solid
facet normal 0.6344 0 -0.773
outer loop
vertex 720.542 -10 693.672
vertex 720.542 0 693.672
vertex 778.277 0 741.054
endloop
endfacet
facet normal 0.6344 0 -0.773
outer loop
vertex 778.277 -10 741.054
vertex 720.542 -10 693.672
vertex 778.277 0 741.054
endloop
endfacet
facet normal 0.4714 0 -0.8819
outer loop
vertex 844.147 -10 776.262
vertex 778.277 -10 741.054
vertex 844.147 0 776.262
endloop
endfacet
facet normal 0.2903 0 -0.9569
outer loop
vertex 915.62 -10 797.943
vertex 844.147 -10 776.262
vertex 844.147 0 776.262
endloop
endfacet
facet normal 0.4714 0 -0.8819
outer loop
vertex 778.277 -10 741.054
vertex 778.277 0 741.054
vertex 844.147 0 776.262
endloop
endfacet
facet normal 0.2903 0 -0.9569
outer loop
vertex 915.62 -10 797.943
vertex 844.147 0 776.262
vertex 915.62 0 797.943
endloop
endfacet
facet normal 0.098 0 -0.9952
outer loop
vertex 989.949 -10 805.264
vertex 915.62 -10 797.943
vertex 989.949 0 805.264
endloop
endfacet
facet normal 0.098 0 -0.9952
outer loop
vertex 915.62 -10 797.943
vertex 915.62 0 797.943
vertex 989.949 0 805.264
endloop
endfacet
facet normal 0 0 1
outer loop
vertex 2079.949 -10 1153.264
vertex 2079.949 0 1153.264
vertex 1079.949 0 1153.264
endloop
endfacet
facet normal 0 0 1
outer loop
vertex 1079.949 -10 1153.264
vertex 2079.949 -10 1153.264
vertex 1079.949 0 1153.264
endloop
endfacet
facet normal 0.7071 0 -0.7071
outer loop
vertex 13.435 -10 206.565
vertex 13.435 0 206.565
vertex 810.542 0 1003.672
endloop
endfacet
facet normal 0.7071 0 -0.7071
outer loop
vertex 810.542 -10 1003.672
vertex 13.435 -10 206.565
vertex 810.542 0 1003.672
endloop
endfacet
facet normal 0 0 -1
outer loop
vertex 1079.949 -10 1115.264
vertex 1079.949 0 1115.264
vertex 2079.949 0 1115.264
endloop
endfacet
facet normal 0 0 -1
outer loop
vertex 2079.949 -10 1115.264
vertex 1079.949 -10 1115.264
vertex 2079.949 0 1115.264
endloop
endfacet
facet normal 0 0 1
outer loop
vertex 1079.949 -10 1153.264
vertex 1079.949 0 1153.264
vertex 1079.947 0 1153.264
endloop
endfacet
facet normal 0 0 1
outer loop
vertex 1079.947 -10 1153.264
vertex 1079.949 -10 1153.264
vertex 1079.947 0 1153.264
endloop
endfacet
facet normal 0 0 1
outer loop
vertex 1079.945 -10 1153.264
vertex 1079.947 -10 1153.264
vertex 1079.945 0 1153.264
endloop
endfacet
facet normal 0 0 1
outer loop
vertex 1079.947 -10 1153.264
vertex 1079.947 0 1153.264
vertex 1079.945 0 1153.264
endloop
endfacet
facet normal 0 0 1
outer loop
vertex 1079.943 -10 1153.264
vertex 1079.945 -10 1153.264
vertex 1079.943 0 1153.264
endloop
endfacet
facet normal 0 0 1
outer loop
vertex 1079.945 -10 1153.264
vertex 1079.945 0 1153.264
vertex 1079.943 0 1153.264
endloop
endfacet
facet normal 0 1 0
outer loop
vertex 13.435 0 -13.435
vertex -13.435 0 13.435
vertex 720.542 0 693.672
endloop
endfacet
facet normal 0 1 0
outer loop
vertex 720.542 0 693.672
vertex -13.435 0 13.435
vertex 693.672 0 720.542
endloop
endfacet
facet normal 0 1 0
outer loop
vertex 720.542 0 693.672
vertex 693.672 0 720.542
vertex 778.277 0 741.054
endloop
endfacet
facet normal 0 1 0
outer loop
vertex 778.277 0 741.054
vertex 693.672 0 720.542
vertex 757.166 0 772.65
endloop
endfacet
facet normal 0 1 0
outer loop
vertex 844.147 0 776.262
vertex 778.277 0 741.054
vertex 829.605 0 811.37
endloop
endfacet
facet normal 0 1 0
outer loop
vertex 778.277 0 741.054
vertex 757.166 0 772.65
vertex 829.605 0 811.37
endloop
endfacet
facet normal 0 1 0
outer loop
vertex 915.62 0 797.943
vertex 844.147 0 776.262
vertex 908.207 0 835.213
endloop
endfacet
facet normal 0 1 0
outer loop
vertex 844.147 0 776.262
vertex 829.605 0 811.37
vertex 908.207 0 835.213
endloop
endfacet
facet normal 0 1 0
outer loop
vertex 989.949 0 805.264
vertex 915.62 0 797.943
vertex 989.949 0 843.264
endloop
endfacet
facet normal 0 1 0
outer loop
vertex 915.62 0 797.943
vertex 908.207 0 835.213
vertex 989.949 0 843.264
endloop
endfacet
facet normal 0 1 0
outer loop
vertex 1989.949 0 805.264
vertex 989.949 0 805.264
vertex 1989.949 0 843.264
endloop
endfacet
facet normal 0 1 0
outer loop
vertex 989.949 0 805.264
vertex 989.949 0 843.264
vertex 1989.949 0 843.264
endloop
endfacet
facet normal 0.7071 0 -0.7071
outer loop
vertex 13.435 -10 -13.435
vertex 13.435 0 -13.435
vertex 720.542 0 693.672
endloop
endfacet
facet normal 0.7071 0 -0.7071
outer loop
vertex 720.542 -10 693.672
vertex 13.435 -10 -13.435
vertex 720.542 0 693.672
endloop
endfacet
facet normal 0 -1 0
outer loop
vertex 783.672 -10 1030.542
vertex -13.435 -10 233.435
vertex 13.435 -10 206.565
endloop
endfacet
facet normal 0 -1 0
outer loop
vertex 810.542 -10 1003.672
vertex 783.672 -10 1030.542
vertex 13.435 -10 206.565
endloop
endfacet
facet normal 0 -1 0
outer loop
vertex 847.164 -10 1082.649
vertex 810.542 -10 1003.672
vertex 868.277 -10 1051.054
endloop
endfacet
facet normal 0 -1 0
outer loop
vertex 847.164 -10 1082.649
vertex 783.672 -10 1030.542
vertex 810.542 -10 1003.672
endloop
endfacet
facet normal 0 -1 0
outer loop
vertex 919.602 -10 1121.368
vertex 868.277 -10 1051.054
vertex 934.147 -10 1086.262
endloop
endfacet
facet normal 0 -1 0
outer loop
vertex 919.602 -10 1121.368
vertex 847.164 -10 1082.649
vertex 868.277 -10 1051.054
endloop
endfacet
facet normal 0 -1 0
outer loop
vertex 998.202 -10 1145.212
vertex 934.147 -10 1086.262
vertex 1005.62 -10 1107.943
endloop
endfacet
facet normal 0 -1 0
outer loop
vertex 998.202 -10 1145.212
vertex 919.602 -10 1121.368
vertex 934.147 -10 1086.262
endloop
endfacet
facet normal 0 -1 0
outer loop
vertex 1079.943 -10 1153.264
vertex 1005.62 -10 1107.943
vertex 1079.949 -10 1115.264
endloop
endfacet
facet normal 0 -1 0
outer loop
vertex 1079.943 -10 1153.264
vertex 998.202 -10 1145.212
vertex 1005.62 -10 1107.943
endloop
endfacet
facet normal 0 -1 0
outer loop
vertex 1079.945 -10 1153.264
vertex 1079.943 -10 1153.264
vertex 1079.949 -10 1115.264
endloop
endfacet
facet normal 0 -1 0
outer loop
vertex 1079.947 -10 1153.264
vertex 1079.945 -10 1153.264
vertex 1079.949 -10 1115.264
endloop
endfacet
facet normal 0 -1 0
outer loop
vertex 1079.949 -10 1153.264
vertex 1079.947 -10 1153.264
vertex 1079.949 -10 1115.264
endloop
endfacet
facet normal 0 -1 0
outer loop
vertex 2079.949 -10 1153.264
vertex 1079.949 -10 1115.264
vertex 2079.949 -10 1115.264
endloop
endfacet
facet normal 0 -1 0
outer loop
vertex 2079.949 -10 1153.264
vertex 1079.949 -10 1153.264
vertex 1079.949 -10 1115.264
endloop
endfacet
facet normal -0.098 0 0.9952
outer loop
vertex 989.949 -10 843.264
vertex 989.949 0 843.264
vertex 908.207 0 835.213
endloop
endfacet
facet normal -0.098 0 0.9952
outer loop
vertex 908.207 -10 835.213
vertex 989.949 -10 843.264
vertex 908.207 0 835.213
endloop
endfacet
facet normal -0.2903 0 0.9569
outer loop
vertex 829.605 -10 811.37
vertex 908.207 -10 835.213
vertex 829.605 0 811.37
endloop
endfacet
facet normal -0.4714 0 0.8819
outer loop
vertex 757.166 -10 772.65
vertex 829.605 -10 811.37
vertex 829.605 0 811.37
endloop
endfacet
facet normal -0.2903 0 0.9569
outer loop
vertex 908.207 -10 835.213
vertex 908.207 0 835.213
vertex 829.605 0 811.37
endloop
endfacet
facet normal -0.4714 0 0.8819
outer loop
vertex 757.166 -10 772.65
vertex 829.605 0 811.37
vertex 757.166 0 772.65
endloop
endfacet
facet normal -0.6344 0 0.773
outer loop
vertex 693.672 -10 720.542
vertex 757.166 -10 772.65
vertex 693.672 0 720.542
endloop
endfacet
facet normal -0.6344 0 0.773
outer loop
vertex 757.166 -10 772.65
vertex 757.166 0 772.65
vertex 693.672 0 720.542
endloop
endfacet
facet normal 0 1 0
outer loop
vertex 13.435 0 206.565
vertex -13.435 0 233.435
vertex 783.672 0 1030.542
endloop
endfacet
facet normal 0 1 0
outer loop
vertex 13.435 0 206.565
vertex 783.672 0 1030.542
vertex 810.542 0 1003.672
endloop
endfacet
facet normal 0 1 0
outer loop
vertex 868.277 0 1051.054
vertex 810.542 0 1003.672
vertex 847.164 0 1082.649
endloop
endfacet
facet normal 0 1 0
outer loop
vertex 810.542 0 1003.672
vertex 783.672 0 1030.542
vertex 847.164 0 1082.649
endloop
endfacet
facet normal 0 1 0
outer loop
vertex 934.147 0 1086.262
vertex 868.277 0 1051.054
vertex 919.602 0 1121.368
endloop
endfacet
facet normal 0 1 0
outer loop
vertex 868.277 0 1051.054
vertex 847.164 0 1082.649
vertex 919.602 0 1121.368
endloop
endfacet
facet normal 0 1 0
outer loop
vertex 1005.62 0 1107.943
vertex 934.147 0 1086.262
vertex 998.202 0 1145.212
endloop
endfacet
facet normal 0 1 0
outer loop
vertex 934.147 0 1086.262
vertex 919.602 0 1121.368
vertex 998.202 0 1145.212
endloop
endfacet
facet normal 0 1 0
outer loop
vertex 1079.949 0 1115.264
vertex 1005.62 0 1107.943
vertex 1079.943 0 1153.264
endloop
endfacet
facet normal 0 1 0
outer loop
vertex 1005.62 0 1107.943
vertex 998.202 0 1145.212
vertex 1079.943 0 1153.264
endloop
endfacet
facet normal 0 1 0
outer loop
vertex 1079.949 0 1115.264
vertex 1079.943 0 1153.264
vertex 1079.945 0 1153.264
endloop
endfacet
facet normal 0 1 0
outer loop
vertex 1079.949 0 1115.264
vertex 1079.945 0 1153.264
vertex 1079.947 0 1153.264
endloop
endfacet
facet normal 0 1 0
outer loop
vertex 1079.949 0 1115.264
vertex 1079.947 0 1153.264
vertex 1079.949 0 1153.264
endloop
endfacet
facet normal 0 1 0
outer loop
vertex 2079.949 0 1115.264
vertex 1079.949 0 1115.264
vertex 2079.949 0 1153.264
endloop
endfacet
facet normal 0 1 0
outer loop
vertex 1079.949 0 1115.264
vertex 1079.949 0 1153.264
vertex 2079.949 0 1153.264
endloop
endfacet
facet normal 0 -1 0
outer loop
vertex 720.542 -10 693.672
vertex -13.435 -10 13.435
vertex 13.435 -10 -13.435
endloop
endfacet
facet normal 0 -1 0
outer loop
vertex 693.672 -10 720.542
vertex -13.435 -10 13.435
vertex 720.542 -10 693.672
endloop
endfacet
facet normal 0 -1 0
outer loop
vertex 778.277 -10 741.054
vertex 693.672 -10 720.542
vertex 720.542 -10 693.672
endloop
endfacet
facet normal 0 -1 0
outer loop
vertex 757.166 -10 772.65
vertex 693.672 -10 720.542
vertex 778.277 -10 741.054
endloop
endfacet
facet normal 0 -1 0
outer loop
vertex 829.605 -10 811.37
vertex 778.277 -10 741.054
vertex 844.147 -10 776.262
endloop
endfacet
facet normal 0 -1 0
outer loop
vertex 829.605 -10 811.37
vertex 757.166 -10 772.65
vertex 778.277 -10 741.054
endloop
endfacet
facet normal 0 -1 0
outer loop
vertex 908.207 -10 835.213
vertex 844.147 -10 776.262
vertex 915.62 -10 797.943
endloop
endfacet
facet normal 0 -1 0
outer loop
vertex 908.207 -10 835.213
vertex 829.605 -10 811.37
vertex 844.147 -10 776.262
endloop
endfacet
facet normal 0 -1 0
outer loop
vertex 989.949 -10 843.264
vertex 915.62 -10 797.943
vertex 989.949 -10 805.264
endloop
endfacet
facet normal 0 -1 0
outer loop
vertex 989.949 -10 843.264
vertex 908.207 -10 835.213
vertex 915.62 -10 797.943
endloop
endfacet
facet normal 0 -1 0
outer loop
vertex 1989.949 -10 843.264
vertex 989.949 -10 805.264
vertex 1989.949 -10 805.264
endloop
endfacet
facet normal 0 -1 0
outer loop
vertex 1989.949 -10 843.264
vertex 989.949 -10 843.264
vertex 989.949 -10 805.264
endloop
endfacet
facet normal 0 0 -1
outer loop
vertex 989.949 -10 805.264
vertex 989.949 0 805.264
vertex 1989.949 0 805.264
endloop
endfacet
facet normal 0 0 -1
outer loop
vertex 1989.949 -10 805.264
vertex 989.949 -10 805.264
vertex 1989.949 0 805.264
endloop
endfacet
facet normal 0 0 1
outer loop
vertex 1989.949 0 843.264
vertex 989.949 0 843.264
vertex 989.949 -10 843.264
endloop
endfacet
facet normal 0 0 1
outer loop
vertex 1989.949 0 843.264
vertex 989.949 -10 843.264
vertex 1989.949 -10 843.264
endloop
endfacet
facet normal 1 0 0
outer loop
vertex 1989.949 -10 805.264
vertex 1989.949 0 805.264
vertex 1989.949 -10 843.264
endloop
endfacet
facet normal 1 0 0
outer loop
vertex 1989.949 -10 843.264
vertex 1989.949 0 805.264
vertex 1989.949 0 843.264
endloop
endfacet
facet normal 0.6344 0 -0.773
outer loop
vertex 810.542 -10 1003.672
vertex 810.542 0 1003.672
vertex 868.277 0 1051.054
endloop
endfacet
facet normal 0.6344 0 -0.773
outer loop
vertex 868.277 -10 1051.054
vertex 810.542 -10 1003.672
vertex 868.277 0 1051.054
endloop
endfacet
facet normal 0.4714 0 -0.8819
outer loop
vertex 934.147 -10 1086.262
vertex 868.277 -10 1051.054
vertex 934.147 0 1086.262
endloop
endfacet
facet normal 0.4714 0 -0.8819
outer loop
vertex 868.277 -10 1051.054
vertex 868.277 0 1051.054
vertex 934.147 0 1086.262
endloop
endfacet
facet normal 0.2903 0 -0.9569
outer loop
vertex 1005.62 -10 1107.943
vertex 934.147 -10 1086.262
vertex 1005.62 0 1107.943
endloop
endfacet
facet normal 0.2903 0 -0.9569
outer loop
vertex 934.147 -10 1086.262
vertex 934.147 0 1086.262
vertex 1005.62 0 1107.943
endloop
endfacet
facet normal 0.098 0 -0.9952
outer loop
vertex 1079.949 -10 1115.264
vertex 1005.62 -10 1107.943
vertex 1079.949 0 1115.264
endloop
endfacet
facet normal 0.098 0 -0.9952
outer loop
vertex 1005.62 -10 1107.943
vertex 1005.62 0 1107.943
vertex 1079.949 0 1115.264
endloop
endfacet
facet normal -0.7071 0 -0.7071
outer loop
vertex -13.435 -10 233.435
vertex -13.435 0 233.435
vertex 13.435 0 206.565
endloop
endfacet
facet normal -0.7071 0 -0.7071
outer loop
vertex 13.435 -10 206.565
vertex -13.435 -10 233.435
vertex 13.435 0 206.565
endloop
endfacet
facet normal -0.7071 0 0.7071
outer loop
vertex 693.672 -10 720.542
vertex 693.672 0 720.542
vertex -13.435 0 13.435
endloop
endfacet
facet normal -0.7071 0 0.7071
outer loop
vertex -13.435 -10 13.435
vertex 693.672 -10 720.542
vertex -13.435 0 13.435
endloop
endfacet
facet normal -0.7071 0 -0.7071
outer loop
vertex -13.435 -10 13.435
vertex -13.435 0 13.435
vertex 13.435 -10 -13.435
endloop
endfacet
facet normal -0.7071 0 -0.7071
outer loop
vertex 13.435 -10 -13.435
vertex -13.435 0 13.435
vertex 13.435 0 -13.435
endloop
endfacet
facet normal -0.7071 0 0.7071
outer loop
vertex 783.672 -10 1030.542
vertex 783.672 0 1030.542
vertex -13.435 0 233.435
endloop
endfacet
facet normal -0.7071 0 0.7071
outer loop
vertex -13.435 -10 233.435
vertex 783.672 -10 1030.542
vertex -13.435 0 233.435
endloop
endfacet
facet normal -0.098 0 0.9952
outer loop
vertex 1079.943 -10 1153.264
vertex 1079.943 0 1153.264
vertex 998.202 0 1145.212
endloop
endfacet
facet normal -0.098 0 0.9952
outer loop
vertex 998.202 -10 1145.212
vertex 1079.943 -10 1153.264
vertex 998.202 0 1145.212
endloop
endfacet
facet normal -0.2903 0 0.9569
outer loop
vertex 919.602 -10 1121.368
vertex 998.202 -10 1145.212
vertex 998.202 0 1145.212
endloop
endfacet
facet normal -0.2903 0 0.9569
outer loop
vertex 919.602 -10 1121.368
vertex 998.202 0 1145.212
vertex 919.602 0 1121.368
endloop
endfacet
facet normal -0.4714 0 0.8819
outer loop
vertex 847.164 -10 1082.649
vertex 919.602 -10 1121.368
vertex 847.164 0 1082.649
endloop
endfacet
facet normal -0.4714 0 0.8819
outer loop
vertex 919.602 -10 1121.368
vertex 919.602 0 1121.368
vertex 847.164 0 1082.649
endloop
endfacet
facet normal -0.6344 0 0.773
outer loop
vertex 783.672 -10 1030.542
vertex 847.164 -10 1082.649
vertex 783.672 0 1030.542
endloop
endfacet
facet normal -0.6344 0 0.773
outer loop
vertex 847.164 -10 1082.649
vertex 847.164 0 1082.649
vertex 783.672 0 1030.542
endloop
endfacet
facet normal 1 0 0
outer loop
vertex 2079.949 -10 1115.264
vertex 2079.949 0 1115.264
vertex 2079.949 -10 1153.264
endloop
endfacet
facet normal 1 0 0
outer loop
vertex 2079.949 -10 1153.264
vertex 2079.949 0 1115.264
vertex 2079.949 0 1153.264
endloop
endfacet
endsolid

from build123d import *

# Parameters (mm, degrees)
F1_DEPTH = 10
F0_W     = 1000
F0_H     = 3.5


with BuildPart() as f1:
    # F0 (on Front) → F1 (new body)
    with BuildSketch(Plane.XZ):
        with BuildLine():
            Line((786.1466260782, 1028.0669362949), (696.1466260782, 938.0669362949))
            Line((696.1466260782, 938.0669362949), (-10.9601551084, 230.9601551084))
            Line((-10.9601551084, 230.9601551084), (0, 220))
            Line((0, 220), (13.4350288425, 206.5649711575))
            Line((13.4350288425, 206.5649711575), (810.5418100291, 1003.671752344))
            ThreePointArc((810.5418100291, 1003.671752344), (934.1471059301, 1086.2621705987), (1079.9494936612, 1115.2640687119))
            Line((1079.9494936612, 1115.2640687119), (2079.9494936612, 1115.2640687119))
            Line((2079.9494936612, 1115.2640687119), (2079.9494936612, 1134.2640687119))
            Line((2079.9494936612, 1134.2640687119), (2079.9494936612, 1149.7640686668))
            Line((2079.9494936612, 1149.7640686668), (1079.9433686799, 1149.7640686668))
            ThreePointArc((1079.9433686799, 1149.7640686668), (920.9416981454, 1118.1348424955), (786.1466260782, 1028.0669362949))
        make_face()
        Polygon((-10.9601551084, 230.9601551084), (696.1466260782, 938.0669362949), (693.671752344, 940.5418100291), (-13.4350288425, 233.4350288425), align=None)
        with BuildLine():
            Line((783.671752344, 1030.5418100291), (786.1466260782, 1028.0669362949))
            ThreePointArc((786.1466260782, 1028.0669362949), (920.9416981454, 1118.1348424955), (1079.9433686799, 1149.7640686668))
            Line((1079.9433686799, 1149.7640686668), (2079.9494936612, 1149.7640686668))
            Line((2079.9494936612, 1149.7640686668), (2079.9494936612, 1153.2640687119))
            Line((2079.9494936612, 1153.2640687119), (1079.9494936612, 1153.2640687119))
            ThreePointArc((1079.9494936612, 1153.2640687119), (1079.9464311705, 1153.2640687007), (1079.9433686799, 1153.2640686672))
            ThreePointArc((1079.9433686799, 1153.2640686672), (919.6023061321, 1121.3684208594), (783.671752344, 1030.5418100291))
        make_face()
        Polygon((693.671752344, 940.5418100291), (696.1466260782, 938.0669362949), (786.1466260782, 1028.0669362949), (783.671752344, 1030.5418100291), align=None)
    extrude(amount=F1_DEPTH)


with BuildPart() as f1b:
    # F0 (on Front) → F1, piece 2 (new body)
    with BuildSketch(Plane.XZ):
        with BuildLine():
            Line((-10.9601551084, 10.9601551084), (0, 0))
            Line((0, 0), (13.4350288425, -13.4350288425))
            Line((13.4350288425, -13.4350288425), (720.5418100291, 693.671752344))
            ThreePointArc((720.5418100291, 693.671752344), (844.1471059301, 776.2621705987), (989.9494936612, 805.2640687119))
            Line((989.9494936612, 805.2640687119), (1989.9494936612, 805.2640687119))
            Line((1989.9494936612, 805.2640687119), (1989.9494936612, 824.2640687119))
            Line((1989.9494936612, 824.2640687119), (1989.9494936612, 839.7640687119))
            Line((1989.9494936612, 839.7640687119), (989.9494936612, 839.7640687119))
            ThreePointArc((989.9494936612, 839.7640687119), (830.9445275135, 808.1360144704), (696.1466260782, 718.0669362949))
            Line((696.1466260782, 718.0669362949), (-10.9601551084, 10.9601551084))
        make_face()
        Polygon((-13.4350288425, 13.4350288425), (-10.9601551084, 10.9601551084), (696.1466260782, 718.0669362949), (693.671752344, 720.5418100291), align=None)
        with Locations((1489.9494936612, 841.5140687119)):
            Rectangle(F0_W, F0_H)
        with BuildLine():
            Line((693.671752344, 720.5418100291), (696.1466260782, 718.0669362949))
            ThreePointArc((696.1466260782, 718.0669362949), (830.9445275135, 808.1360144704), (989.9494936612, 839.7640687119))
            Line((989.9494936612, 839.7640687119), (989.9494936612, 843.2640687119))
            ThreePointArc((989.9494936612, 843.2640687119), (829.6051355002, 811.3695928342), (693.671752344, 720.5418100291))
        make_face()
    extrude(amount=F1_DEPTH)


solid = Compound([f1.part, f1b.part])
